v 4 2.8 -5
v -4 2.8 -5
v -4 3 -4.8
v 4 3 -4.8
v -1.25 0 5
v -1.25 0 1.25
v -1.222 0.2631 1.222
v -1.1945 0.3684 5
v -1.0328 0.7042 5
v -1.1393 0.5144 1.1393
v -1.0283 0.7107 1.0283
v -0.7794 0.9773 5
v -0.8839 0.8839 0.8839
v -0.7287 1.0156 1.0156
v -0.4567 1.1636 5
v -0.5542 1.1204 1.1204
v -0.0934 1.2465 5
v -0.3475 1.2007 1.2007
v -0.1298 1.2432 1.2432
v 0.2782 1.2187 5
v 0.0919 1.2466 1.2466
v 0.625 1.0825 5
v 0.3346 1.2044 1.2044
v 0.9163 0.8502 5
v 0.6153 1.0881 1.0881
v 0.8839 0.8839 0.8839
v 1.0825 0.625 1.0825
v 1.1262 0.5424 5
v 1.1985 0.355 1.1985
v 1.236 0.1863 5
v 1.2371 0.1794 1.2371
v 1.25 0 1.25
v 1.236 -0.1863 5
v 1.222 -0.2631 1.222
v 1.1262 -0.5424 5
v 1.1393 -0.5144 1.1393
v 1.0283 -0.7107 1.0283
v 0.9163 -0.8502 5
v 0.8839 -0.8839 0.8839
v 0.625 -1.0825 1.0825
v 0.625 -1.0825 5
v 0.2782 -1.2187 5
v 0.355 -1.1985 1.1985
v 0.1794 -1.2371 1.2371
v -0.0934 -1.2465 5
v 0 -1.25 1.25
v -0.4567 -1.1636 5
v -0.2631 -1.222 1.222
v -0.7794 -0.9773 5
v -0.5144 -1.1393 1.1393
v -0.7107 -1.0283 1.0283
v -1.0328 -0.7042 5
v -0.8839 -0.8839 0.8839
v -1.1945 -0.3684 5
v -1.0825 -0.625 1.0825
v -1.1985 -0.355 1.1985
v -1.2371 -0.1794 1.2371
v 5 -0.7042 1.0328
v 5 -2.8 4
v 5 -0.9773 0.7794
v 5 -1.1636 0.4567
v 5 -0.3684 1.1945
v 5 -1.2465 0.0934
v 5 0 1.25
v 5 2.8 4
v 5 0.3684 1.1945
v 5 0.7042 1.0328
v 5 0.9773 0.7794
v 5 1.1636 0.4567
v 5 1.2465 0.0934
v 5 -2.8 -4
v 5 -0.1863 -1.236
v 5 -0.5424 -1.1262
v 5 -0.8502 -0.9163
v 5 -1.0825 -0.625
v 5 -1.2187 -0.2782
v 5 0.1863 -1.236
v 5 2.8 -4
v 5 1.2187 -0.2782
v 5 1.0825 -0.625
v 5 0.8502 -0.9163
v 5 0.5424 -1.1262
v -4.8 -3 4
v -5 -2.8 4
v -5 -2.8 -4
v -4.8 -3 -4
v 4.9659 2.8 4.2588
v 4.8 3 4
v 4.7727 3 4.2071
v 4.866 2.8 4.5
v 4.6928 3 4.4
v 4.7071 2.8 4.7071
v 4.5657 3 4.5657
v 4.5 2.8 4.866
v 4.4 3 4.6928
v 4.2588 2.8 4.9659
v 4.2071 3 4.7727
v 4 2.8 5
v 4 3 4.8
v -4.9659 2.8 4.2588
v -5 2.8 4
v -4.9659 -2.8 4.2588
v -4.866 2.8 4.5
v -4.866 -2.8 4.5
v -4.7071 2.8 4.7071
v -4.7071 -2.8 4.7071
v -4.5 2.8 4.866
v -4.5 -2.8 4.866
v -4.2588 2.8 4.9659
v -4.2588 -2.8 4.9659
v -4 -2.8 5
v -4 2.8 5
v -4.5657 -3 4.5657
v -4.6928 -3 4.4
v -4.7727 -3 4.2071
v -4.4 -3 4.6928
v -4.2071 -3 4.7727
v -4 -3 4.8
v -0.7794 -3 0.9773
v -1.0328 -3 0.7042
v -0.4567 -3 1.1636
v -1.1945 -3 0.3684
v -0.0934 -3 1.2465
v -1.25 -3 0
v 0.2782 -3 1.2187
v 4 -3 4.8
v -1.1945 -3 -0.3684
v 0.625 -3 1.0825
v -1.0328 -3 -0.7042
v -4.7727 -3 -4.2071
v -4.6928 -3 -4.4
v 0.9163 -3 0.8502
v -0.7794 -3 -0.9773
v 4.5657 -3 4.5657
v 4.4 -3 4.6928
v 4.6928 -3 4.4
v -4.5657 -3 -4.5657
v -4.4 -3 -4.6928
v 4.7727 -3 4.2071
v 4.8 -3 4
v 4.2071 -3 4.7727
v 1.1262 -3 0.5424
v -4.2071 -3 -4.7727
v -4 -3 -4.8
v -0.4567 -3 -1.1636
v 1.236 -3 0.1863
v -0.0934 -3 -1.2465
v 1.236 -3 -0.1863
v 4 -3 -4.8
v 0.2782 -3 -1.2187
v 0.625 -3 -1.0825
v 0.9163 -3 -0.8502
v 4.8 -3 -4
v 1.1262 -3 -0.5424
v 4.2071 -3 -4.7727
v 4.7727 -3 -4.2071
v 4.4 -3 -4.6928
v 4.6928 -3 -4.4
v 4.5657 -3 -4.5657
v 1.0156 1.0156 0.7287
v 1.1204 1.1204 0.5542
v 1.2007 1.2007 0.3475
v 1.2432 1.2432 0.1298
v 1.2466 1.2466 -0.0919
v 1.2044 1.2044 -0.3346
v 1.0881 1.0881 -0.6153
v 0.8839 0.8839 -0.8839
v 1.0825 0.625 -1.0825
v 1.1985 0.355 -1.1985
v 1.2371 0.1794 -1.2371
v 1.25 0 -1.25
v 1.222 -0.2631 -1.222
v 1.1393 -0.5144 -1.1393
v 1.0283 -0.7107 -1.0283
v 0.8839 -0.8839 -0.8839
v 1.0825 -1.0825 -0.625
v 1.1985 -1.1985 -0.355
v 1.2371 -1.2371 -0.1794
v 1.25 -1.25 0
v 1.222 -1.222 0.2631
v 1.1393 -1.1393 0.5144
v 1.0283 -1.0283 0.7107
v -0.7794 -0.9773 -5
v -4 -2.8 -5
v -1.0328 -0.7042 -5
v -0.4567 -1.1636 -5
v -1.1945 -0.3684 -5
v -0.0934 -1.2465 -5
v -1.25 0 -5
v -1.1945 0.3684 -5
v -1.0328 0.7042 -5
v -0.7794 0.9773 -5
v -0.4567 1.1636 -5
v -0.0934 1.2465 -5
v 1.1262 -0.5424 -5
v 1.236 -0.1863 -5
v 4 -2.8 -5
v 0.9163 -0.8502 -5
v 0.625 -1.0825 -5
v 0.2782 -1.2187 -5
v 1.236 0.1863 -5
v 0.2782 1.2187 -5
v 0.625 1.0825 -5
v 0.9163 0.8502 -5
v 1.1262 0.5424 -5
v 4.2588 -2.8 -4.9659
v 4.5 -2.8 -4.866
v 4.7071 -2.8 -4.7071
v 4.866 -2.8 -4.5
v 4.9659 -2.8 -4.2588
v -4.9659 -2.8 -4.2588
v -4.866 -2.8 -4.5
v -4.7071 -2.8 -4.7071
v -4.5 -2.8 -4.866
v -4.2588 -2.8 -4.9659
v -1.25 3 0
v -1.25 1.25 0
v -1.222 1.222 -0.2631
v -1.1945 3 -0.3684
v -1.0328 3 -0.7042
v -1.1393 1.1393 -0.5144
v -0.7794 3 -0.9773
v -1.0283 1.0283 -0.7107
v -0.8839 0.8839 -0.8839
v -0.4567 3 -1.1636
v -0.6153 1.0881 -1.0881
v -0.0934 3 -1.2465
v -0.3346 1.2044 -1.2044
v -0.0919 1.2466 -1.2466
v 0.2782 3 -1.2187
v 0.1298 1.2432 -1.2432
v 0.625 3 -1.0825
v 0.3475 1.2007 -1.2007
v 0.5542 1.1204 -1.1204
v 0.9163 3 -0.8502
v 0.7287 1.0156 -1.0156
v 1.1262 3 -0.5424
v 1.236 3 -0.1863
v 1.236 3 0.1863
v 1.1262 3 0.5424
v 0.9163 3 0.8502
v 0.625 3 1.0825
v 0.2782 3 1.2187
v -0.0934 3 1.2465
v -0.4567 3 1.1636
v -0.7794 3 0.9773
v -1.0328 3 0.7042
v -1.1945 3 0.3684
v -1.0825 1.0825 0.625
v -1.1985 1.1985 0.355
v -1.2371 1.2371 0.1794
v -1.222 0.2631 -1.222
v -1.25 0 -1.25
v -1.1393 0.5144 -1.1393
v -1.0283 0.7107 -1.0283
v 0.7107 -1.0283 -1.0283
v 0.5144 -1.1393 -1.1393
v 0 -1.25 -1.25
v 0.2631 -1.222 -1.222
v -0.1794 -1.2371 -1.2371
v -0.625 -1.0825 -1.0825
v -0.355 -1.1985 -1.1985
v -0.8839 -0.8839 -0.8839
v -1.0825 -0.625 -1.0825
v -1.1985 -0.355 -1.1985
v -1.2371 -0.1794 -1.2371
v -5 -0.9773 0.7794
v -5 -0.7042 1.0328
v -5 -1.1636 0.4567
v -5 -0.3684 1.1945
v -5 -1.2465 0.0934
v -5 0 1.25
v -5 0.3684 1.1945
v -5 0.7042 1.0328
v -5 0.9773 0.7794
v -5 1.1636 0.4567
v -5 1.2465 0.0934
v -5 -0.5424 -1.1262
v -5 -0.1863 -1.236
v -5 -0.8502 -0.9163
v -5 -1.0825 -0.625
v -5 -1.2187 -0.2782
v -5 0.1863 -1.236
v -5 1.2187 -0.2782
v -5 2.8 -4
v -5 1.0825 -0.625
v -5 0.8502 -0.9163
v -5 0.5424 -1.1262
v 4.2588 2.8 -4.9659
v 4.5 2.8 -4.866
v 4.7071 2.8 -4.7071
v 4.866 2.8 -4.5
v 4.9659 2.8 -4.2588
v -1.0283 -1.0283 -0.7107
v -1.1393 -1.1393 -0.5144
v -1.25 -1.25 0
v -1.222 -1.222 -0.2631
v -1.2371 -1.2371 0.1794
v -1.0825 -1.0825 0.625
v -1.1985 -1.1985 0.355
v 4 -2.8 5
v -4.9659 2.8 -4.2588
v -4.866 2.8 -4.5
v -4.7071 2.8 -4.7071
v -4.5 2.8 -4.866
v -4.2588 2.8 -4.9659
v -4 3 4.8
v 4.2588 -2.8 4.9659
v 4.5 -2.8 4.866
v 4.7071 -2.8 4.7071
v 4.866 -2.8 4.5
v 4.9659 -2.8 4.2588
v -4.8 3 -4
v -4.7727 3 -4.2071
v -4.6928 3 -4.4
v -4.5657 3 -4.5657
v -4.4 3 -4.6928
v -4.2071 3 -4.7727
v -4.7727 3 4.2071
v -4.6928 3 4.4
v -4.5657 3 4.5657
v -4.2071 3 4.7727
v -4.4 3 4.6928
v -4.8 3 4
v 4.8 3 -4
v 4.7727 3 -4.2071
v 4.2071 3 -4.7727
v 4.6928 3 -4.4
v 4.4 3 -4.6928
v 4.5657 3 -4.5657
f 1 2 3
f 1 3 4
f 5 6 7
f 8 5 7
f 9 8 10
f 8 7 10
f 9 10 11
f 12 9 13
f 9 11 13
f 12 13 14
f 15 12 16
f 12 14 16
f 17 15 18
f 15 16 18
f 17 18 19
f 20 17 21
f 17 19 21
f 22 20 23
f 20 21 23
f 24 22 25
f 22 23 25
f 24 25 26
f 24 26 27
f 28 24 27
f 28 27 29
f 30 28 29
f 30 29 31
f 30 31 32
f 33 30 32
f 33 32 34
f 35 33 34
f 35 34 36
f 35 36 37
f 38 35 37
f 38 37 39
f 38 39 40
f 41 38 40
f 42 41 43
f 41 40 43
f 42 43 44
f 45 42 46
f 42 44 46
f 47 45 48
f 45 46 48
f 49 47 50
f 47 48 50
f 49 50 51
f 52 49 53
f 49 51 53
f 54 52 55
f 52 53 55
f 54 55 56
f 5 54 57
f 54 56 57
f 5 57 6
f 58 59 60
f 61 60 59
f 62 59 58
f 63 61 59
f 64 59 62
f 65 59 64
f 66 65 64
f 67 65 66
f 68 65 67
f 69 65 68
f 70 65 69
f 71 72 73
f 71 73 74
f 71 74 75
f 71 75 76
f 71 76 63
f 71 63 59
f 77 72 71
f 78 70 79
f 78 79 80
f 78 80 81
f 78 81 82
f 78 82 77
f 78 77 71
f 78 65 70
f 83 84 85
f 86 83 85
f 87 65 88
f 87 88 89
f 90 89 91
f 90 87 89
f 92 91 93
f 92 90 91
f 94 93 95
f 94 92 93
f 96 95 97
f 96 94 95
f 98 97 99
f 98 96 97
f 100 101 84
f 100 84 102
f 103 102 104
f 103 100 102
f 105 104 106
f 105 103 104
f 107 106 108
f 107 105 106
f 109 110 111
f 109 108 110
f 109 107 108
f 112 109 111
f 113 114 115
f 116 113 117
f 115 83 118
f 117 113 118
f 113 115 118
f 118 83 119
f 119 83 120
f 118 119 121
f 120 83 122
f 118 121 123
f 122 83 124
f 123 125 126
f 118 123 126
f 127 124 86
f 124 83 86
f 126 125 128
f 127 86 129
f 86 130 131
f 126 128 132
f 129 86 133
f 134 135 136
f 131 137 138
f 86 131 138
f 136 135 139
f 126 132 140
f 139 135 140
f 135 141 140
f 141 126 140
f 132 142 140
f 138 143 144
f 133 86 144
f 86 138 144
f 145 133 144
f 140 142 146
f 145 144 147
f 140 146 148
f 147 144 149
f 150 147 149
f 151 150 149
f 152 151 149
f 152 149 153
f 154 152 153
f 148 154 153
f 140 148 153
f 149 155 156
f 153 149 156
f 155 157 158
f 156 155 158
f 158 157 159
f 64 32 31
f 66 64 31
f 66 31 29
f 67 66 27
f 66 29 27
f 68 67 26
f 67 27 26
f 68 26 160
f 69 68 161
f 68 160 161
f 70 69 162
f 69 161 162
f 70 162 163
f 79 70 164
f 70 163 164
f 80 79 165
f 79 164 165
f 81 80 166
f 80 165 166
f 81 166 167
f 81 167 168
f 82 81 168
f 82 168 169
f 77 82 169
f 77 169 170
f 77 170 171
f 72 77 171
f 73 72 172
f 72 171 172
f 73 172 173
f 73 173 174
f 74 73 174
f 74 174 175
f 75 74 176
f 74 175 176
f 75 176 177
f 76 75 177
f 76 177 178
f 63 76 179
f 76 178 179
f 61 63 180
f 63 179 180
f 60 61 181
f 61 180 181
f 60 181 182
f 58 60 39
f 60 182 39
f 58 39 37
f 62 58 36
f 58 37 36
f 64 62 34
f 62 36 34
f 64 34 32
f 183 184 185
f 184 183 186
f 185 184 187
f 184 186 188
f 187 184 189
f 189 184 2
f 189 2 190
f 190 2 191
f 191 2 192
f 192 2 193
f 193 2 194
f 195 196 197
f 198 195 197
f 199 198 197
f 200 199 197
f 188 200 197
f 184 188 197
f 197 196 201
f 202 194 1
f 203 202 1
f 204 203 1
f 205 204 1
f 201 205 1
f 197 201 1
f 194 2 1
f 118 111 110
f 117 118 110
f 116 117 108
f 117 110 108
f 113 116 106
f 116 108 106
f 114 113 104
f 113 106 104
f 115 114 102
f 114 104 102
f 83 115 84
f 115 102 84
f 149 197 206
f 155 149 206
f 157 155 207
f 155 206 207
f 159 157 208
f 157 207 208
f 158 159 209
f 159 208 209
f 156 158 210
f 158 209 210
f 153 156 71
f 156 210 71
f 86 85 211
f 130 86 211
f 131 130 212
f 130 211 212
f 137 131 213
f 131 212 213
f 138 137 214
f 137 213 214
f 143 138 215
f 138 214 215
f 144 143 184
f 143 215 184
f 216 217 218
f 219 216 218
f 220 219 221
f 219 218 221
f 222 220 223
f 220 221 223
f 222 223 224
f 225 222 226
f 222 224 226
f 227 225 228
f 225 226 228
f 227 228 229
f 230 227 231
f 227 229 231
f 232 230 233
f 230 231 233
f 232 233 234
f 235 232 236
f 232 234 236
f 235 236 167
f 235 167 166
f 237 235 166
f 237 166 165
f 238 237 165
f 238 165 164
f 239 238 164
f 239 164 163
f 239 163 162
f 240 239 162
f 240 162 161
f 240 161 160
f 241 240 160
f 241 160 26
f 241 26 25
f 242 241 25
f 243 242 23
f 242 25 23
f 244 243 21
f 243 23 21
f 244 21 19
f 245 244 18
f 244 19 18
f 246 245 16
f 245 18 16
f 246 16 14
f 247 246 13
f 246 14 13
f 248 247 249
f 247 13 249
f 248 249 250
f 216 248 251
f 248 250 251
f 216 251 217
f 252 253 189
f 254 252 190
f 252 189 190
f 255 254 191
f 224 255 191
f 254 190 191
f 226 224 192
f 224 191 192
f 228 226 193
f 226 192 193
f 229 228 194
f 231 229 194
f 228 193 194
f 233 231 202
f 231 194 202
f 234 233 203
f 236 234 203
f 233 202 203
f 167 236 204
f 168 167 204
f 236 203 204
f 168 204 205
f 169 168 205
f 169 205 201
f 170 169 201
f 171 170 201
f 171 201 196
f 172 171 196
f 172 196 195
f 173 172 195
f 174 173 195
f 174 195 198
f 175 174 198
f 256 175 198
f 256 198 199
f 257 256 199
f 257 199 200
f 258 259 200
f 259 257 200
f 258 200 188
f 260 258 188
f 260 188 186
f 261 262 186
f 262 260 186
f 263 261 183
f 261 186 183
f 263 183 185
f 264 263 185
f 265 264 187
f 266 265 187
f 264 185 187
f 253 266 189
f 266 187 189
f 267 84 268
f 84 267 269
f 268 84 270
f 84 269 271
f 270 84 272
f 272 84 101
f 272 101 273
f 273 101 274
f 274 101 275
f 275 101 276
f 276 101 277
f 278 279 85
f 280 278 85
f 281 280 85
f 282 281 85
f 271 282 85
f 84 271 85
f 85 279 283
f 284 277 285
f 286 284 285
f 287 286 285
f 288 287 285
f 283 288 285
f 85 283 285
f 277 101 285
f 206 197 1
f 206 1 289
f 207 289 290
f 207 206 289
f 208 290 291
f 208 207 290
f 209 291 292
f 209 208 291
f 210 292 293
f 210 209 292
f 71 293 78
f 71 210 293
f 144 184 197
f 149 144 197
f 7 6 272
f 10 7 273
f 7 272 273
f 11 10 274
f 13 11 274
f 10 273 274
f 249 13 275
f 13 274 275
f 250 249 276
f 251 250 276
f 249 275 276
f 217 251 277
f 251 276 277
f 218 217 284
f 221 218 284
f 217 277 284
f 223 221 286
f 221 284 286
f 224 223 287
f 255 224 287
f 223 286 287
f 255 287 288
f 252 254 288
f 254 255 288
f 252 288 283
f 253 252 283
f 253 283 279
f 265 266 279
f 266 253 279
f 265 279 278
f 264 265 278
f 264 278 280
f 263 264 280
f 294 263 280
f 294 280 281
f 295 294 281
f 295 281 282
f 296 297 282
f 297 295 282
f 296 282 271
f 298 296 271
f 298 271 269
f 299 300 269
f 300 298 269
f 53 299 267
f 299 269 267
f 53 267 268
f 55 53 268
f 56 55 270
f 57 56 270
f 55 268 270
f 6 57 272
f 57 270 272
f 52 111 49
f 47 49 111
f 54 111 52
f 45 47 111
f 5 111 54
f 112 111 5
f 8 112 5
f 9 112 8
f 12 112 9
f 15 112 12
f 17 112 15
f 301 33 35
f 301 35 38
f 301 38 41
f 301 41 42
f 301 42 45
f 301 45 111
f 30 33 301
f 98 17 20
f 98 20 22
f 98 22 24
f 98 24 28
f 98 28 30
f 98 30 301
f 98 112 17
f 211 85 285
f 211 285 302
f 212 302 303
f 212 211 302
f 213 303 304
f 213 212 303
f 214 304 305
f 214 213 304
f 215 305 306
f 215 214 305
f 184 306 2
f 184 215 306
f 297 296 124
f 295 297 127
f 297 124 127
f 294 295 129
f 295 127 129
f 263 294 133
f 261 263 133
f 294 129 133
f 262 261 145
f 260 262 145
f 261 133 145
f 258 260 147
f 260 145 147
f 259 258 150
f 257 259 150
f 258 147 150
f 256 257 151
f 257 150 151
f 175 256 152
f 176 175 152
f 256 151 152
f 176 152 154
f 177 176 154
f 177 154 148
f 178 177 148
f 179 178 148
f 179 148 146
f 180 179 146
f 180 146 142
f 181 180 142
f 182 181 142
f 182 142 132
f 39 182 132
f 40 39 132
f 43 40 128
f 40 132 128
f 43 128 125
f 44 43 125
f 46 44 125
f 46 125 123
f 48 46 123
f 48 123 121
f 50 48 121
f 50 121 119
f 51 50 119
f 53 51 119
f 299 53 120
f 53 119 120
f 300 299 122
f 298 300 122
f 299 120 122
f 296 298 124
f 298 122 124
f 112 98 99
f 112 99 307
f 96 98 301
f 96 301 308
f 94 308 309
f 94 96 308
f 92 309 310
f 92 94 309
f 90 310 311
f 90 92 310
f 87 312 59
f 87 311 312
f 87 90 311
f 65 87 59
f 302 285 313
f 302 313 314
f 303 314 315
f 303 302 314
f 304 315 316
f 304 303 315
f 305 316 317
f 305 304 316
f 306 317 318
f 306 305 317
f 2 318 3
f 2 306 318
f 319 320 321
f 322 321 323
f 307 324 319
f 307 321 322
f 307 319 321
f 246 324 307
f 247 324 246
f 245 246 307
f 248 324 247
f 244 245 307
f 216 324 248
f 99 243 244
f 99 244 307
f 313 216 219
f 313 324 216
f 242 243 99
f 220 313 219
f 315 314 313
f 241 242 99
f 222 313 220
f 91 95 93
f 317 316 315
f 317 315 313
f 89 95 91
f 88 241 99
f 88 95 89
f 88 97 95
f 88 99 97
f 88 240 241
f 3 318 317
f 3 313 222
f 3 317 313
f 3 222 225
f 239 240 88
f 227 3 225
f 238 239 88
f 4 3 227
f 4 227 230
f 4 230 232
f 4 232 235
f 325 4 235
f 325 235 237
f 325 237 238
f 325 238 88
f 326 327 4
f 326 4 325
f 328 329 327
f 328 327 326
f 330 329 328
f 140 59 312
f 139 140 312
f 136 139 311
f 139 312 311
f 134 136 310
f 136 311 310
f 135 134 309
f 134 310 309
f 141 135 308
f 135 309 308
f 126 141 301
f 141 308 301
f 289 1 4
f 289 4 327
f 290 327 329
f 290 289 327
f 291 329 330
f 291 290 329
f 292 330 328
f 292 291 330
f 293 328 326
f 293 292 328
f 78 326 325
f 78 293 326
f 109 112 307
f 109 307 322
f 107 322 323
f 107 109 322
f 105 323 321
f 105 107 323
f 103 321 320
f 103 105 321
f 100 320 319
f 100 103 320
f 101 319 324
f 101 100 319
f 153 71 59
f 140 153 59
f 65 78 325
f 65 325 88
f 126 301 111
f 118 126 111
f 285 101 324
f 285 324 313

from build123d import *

# Parameters (mm, degrees)
SKETCH_1_W         = 10
SKETCH_1_H         = 10
EXTRUDE_1_DEPTH    = 3
HOLE_WIZARD_M3_1_D = 2.5
HOLE_WIZARD_M3_2_D = 2.5
HOLE_WIZARD_M3_3_D = 2.5
FILLET_1_R         = 1
CHAMFER_1_SIZE     = 0.2


with BuildPart() as part:
    # 草图1 → 凸台-拉伸1 (new, symmetric)
    with BuildSketch(Plane(origin=(0, 0, 0), x_dir=(1, 0, 0), z_dir=(0, 1, 0))):
        Rectangle(SKETCH_1_W, SKETCH_1_H)
    extrude(amount=EXTRUDE_1_DEPTH, both=True)

    # M3 螺纹孔1 (through all)
    with Locations(Plane(origin=(0, 3, 0), x_dir=(1, 0, 0), z_dir=(0, 1, 0))):
        with Locations((0, 0)):
            Hole(HOLE_WIZARD_M3_1_D / 2)

    # M3 螺纹孔2 (through all)
    with Locations(Plane.XY.offset(5)):
        with Locations((0, 0)):
            Hole(HOLE_WIZARD_M3_2_D / 2)

    # M3 螺纹孔3 (through all)
    with Locations(Plane(origin=(5, 0, 0), x_dir=(0, 0, -1), z_dir=(1, 0, 0))):
        with Locations((0, 0)):
            Hole(HOLE_WIZARD_M3_3_D / 2)

    # 圆角1
    fillet_1_edges = [part.edges().sort_by_distance(p)[0] for p in [
        (5, 0, 5),
        (-5, 0, 5),
        (-5, 0, -5),
        (5, 0, -5),
    ]]
    fillet(fillet_1_edges, radius=FILLET_1_R)

    # 倒角1
    chamfer_1_edges = [part.edges().sort_by_distance(p)[0] for p in [
        (0, -3, -5),
        (0, 3, -5),
        (5, -3, 0),
        (0, -3, 5),
        (-5, -3, 0),
        (-4.707106781, -3, -4.707106781),
        (-4.707106781, -3, 4.707106781),
        (4.707106781, -3, 4.707106781),
        (4.707106781, -3, -4.707106781),
        (5, 3, 0),
        (-5, 3, 0),
        (0, 3, 5),
        (-4.707106781, 3, -4.707106781),
        (-4.707106781, 3, 4.707106781),
        (4.707106781, 3, 4.707106781),
        (4.707106781, 3, -4.707106781),
    ]]
    chamfer(chamfer_1_edges, length=CHAMFER_1_SIZE)


solid = part.part
